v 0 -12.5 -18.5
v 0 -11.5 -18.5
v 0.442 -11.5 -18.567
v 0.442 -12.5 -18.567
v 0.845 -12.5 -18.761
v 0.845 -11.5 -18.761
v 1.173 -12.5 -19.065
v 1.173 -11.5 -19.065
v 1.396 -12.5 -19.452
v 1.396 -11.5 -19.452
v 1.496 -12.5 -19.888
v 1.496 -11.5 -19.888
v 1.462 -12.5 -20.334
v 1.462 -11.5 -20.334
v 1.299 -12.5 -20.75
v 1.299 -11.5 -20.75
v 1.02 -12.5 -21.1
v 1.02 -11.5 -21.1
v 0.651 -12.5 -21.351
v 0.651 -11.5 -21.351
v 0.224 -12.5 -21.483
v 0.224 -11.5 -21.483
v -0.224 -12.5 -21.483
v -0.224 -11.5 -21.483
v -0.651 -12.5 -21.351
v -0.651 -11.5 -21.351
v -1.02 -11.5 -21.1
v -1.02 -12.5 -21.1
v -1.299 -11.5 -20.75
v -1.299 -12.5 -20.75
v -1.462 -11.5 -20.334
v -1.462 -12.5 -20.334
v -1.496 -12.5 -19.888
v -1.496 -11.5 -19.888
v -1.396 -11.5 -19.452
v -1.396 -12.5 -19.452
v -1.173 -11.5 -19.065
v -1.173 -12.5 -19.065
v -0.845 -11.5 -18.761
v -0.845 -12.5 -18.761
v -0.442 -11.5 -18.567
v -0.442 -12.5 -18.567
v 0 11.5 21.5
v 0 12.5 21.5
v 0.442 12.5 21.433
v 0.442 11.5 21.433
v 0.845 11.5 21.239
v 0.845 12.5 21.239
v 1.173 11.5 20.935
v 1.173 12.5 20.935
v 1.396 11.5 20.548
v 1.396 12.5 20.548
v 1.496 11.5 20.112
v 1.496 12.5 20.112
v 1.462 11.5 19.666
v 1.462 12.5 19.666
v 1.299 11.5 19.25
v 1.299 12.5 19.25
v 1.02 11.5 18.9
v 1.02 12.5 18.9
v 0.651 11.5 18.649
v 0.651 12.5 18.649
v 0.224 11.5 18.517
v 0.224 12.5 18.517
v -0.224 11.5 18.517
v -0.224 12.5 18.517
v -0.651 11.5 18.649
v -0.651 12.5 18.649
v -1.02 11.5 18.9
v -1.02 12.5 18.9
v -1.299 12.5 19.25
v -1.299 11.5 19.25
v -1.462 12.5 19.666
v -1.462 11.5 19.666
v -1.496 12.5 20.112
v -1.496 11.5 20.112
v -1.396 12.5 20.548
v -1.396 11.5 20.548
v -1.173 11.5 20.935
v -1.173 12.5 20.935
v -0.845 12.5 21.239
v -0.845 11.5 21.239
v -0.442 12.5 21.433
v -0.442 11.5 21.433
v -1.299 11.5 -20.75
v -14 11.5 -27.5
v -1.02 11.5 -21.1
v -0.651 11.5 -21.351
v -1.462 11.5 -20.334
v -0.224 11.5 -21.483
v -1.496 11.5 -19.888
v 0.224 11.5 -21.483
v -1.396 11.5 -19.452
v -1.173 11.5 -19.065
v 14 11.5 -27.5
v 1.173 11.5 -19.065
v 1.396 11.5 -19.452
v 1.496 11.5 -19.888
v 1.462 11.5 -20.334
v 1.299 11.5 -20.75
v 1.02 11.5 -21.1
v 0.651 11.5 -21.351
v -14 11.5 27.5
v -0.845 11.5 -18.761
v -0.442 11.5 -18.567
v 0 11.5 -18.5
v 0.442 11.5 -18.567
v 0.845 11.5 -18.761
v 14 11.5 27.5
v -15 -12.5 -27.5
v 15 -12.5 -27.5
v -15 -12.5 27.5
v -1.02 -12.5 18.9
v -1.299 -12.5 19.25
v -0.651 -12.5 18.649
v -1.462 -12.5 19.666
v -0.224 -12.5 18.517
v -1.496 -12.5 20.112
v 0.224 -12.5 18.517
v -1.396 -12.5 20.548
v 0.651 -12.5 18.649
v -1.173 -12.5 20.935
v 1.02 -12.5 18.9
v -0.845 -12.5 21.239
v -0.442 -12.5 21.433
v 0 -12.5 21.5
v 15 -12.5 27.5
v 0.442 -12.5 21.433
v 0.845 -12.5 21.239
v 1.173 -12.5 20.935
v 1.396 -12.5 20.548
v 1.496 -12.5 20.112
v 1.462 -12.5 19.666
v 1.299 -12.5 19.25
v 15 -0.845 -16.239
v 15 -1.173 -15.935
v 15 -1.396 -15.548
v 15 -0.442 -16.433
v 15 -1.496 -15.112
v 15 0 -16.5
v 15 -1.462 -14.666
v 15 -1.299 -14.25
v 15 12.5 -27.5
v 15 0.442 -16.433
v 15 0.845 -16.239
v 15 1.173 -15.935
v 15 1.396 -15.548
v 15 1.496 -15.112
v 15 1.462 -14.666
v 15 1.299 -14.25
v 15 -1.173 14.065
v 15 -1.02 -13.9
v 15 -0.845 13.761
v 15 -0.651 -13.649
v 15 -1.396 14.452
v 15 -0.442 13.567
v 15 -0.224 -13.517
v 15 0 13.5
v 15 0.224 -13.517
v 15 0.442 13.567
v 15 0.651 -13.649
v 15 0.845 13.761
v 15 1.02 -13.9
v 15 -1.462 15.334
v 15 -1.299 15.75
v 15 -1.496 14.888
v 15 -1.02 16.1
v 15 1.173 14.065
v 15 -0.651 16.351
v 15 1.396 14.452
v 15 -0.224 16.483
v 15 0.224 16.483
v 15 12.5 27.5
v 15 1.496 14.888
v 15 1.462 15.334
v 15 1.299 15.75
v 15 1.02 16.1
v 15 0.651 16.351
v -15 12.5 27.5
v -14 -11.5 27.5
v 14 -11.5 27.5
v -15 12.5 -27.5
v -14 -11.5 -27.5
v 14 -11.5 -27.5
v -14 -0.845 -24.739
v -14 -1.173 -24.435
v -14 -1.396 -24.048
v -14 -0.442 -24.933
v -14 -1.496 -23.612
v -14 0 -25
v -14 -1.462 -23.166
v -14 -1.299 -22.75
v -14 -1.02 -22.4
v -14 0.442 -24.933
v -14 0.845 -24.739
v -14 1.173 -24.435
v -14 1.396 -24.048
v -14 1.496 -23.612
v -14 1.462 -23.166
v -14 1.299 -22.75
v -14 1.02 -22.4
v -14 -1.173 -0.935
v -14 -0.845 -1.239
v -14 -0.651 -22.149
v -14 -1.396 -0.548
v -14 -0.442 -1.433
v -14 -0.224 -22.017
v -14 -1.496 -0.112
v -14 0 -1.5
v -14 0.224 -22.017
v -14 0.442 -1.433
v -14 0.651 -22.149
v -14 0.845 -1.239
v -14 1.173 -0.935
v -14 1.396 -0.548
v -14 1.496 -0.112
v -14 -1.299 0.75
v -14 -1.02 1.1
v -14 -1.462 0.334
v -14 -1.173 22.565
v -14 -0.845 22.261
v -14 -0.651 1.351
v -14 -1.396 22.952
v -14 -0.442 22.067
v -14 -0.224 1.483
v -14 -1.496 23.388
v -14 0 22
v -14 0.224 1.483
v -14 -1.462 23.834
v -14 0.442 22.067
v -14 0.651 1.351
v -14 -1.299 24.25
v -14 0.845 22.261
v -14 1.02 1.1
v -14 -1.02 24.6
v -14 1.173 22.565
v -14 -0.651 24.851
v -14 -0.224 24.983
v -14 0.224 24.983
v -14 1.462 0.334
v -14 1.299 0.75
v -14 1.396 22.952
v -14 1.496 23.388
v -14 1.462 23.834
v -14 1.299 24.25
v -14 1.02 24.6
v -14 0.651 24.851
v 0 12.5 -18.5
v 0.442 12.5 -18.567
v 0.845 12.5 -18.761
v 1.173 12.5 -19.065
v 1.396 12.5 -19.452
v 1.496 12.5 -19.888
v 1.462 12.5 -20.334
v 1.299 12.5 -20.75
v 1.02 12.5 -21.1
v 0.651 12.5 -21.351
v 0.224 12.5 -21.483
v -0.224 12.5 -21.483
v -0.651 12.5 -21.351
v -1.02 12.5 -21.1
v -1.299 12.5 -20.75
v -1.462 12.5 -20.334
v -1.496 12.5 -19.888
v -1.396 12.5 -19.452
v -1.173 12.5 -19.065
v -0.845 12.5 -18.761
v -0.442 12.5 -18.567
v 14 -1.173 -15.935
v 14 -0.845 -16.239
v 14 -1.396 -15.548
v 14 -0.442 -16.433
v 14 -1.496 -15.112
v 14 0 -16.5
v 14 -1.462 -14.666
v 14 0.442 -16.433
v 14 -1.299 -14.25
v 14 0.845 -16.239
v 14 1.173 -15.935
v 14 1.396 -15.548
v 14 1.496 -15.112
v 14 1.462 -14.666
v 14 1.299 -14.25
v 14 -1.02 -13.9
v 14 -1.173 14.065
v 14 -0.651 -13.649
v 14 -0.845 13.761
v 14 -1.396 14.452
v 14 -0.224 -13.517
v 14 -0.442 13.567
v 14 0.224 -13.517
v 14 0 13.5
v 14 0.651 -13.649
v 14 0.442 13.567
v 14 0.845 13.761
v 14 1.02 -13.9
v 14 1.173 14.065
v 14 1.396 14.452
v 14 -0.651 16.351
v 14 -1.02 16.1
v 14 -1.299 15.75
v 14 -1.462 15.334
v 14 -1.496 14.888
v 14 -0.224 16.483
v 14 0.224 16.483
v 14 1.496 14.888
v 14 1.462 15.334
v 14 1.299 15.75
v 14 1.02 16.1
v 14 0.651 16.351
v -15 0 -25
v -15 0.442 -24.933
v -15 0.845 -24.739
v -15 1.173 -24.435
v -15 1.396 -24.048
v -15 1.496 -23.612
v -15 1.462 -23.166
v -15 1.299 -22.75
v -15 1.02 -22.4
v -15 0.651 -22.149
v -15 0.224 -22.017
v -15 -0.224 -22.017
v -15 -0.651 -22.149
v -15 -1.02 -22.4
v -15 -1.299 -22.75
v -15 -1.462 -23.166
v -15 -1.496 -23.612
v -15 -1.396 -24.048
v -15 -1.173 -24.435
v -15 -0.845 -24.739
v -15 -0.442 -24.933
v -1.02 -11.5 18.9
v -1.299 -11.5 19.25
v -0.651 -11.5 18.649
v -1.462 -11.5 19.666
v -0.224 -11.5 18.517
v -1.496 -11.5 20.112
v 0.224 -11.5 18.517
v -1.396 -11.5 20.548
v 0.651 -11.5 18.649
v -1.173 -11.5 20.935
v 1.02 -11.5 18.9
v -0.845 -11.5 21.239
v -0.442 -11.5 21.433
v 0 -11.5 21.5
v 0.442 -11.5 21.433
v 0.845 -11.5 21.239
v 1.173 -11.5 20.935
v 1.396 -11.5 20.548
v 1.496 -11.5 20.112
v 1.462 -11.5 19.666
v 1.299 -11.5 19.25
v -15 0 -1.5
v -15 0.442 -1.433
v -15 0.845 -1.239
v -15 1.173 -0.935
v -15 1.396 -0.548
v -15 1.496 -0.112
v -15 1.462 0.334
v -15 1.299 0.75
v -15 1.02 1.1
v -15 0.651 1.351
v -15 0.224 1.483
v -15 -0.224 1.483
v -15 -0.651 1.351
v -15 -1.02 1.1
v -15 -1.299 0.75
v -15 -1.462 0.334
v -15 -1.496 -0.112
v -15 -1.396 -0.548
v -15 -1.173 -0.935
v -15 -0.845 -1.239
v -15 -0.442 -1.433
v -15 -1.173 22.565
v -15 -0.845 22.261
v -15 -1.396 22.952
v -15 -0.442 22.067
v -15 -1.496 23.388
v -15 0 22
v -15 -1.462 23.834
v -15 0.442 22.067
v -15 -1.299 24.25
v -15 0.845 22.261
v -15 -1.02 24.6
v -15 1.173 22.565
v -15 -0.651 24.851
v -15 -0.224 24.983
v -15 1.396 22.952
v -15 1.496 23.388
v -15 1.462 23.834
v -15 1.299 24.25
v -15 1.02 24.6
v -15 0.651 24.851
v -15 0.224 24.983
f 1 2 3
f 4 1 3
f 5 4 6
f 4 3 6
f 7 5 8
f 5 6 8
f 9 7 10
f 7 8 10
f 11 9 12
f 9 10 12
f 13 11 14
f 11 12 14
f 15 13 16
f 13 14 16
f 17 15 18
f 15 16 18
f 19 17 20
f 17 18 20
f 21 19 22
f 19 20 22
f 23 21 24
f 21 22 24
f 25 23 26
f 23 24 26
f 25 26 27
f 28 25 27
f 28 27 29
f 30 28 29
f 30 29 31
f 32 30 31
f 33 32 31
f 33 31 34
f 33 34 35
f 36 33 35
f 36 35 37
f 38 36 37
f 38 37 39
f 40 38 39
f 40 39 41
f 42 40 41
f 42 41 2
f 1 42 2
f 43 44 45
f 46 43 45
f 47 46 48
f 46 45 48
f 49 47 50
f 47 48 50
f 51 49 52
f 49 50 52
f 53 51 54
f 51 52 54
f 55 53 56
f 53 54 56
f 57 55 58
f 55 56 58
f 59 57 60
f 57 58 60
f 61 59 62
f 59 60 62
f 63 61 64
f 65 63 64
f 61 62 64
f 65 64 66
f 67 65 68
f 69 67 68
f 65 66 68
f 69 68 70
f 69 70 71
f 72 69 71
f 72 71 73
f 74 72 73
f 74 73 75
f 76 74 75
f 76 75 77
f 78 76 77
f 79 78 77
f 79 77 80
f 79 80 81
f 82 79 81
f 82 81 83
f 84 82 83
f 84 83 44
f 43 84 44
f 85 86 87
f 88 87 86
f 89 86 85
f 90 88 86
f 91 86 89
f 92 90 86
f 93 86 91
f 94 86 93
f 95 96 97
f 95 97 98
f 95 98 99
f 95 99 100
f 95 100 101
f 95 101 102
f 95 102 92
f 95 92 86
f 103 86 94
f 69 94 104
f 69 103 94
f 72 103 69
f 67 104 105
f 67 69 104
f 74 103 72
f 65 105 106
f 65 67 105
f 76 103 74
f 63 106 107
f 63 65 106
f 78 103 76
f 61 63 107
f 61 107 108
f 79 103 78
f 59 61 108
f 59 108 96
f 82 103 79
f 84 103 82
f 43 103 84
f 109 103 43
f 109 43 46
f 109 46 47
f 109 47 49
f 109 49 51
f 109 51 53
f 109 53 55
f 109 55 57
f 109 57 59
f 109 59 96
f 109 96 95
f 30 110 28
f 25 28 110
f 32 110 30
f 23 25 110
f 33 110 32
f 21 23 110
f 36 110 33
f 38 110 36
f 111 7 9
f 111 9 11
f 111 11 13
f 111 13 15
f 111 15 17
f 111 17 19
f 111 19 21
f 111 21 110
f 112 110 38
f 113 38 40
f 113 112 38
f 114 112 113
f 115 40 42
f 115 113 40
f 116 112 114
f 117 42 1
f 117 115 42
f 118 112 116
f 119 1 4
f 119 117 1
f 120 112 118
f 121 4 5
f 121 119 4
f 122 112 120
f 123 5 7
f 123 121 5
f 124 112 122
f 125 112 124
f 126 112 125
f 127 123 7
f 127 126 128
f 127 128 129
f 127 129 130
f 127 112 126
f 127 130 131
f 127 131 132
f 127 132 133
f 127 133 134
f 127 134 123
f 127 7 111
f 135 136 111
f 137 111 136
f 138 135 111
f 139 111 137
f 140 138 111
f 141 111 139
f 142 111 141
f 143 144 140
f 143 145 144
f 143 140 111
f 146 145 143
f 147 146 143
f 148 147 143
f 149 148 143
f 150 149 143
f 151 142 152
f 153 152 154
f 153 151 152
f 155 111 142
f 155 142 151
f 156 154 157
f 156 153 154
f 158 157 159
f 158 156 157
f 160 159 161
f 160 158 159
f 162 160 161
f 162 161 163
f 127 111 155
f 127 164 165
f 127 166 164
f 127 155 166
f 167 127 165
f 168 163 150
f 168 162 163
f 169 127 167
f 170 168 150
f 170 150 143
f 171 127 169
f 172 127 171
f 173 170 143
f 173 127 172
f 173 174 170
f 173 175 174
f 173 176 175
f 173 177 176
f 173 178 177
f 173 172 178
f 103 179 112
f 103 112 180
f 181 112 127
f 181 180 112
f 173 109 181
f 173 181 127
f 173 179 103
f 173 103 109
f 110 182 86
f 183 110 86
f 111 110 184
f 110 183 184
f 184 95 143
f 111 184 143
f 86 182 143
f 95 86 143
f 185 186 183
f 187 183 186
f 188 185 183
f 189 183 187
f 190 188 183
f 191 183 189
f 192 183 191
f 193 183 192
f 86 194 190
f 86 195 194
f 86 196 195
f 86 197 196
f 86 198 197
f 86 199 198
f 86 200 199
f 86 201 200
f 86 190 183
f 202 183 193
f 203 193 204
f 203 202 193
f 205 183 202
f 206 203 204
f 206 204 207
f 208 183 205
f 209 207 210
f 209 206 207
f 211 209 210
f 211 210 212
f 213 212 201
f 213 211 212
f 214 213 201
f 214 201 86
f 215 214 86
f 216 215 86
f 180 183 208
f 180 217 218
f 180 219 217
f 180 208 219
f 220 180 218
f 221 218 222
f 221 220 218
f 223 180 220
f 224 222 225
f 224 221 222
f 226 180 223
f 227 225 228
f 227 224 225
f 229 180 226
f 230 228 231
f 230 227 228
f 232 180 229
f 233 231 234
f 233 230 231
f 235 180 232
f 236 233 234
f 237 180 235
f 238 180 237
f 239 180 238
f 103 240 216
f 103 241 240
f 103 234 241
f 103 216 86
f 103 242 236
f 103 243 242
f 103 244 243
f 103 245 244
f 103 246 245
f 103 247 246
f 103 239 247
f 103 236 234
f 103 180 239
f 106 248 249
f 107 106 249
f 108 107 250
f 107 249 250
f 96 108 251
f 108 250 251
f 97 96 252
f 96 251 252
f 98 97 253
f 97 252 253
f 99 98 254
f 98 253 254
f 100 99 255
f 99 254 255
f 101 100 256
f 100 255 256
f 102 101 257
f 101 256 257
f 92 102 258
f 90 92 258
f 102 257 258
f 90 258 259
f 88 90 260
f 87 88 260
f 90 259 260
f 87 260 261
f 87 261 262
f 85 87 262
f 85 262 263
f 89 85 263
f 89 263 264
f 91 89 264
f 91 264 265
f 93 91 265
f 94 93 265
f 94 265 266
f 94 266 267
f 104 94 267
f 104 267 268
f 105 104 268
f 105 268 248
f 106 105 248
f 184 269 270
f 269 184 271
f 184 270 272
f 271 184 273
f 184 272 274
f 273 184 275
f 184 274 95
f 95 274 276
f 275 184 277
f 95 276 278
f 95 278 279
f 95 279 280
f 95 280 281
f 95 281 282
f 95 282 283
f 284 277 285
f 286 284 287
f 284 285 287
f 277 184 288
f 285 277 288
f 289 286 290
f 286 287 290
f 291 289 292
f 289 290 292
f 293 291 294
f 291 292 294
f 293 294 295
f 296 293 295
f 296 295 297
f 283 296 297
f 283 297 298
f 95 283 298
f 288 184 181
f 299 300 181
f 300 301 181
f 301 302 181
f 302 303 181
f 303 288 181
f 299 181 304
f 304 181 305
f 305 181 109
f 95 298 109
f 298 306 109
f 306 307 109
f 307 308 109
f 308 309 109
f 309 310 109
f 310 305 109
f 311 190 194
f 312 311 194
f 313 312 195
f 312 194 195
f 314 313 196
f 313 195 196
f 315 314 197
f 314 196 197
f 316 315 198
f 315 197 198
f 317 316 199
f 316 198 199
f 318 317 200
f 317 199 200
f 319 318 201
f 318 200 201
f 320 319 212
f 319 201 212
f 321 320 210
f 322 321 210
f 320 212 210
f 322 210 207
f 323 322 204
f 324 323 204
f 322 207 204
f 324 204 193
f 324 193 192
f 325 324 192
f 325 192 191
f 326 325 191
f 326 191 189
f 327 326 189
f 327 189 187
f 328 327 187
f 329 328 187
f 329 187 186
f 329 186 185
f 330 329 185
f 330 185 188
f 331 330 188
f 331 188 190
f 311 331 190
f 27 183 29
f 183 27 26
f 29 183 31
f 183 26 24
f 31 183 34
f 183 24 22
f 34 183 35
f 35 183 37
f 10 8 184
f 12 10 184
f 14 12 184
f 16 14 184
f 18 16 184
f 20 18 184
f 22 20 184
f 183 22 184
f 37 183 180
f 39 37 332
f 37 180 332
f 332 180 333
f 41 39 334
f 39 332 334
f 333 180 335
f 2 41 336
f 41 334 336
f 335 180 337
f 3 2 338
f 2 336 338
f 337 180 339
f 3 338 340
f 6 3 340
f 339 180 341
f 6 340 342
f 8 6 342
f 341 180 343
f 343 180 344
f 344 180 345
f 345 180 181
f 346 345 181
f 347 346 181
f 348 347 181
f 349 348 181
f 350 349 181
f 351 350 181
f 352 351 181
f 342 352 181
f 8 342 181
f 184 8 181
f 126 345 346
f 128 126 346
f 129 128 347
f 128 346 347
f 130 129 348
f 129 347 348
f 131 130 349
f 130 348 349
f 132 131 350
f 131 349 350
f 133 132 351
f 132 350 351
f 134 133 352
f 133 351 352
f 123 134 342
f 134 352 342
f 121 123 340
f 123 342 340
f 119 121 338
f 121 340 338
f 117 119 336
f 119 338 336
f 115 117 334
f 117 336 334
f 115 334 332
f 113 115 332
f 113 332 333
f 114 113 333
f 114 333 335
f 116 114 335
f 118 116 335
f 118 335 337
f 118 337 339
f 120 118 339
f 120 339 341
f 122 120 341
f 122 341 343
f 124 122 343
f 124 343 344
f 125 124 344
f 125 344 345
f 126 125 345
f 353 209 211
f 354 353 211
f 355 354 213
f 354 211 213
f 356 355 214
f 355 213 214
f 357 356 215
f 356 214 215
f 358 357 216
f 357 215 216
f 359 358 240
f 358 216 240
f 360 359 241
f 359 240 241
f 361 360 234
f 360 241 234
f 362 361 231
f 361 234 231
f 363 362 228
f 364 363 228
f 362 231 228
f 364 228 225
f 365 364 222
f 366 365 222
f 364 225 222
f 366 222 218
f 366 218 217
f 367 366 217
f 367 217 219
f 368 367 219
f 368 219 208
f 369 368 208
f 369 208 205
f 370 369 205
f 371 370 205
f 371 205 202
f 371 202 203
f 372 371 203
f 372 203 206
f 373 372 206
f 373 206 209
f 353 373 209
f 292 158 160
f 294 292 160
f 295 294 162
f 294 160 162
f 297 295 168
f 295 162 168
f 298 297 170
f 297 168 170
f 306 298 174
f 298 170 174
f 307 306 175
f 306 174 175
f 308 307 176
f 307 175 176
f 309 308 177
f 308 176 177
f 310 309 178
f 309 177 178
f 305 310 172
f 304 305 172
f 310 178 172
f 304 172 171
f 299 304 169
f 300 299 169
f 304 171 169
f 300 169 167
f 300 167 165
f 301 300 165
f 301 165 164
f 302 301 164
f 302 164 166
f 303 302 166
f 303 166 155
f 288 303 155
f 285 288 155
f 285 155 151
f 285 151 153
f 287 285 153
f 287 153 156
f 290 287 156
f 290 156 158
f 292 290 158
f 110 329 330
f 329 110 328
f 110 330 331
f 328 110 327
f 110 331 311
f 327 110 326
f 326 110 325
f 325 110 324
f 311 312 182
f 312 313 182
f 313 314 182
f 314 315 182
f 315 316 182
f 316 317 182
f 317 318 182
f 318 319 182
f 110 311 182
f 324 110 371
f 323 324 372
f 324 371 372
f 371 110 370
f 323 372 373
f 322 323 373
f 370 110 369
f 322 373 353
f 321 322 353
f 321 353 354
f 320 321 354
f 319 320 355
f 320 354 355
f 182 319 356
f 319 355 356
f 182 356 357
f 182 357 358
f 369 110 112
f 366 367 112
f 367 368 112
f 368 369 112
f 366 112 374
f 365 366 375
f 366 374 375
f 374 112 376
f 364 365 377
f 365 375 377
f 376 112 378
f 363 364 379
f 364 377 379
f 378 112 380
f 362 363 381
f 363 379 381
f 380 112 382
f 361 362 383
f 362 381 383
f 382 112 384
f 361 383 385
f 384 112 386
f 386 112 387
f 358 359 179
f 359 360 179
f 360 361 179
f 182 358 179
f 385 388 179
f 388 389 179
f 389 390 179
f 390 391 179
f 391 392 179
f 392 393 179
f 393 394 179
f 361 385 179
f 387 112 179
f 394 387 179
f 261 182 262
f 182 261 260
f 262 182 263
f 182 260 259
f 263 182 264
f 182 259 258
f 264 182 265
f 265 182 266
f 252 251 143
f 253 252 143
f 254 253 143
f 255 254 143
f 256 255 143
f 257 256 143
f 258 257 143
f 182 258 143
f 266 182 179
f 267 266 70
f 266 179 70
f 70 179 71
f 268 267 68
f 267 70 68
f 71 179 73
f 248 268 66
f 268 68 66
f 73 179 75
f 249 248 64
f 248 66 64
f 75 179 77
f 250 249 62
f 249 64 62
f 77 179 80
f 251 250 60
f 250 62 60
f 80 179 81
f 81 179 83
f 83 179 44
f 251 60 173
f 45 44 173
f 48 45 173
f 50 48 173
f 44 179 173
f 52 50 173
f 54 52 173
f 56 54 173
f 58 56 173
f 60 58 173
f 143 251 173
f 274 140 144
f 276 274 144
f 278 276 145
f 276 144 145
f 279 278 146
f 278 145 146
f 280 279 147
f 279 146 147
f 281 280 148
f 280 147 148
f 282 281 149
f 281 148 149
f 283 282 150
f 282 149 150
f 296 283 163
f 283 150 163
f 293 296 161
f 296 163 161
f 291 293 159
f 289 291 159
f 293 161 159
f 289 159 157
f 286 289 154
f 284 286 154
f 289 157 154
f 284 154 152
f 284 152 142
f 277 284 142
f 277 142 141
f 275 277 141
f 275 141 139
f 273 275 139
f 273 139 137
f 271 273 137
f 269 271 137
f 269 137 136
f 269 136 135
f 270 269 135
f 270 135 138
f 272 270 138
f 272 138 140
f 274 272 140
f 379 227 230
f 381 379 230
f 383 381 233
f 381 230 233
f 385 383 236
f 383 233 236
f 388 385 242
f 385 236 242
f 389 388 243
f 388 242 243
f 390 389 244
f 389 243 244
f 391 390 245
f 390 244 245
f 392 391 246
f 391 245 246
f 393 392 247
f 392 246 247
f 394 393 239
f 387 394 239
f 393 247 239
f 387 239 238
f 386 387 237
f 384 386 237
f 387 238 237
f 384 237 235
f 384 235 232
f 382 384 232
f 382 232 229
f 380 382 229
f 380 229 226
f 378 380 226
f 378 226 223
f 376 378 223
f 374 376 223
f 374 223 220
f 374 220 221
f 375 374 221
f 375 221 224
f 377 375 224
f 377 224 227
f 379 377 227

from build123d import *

# Parameters (mm, degrees)
SKETCH_1_W          = 30
SKETCH_1_H          = 25
SKETCH_1_W_2        = 28
SKETCH_1_H_2        = 23
EXTRUDE_1_DEPTH     = 27.5
SKETCH_2_R          = 1.5
CUT_EXTRUDE_1_DEPTH = 70
SKETCH_3_R          = 1.5
CUT_EXTRUDE_2_DEPTH = 20
SKETCH_4_R          = 1.5
CUT_EXTRUDE_3_DEPTH = 20


with BuildPart() as part:
    # 草图1 → 凸台-拉伸1 (new, symmetric)
    with BuildSketch(Plane.XY):
        Rectangle(SKETCH_1_W, SKETCH_1_H)
        Rectangle(SKETCH_1_W_2, SKETCH_1_H_2, mode=Mode.SUBTRACT)
    extrude(amount=EXTRUDE_1_DEPTH, both=True)

    # 草图2 → 切除-拉伸1 (cut)
    with BuildSketch(Plane(origin=(0, 12.5, 0), x_dir=(1, 0, 0), z_dir=(0, 1, 0))):
        with Locations(Location((0, 20, 0), (0, 0, 270))):
            Circle(SKETCH_2_R)
        with Locations(Location((0, -20, 0), (0, 0, 270))):
            Circle(SKETCH_2_R)
    extrude(amount=-CUT_EXTRUDE_1_DEPTH, mode=Mode.SUBTRACT)

    # 草图3 → 切除-拉伸2 (cut)
    with BuildSketch(Plane(origin=(-14, 0, 0), x_dir=(0, 0, -1), z_dir=(1, 0, 0))):
        Circle(SKETCH_3_R)
        with Locations((-23.5, 0)):
            Circle(SKETCH_3_R)
        with Locations((23.5, 0)):
            Circle(SKETCH_3_R)
    extrude(amount=-CUT_EXTRUDE_2_DEPTH, mode=Mode.SUBTRACT)

    # 草图4 → 切除-拉伸3 (cut)
    with BuildSketch(Plane(origin=(15, 0, 0), x_dir=(0, 0, -1), z_dir=(1, 0, 0))):
        with Locations((15, 0)):
            Circle(SKETCH_4_R)
        with Locations((-15, 0)):
            Circle(SKETCH_4_R)
    extrude(amount=-CUT_EXTRUDE_3_DEPTH, mode=Mode.SUBTRACT)


solid = part.part
